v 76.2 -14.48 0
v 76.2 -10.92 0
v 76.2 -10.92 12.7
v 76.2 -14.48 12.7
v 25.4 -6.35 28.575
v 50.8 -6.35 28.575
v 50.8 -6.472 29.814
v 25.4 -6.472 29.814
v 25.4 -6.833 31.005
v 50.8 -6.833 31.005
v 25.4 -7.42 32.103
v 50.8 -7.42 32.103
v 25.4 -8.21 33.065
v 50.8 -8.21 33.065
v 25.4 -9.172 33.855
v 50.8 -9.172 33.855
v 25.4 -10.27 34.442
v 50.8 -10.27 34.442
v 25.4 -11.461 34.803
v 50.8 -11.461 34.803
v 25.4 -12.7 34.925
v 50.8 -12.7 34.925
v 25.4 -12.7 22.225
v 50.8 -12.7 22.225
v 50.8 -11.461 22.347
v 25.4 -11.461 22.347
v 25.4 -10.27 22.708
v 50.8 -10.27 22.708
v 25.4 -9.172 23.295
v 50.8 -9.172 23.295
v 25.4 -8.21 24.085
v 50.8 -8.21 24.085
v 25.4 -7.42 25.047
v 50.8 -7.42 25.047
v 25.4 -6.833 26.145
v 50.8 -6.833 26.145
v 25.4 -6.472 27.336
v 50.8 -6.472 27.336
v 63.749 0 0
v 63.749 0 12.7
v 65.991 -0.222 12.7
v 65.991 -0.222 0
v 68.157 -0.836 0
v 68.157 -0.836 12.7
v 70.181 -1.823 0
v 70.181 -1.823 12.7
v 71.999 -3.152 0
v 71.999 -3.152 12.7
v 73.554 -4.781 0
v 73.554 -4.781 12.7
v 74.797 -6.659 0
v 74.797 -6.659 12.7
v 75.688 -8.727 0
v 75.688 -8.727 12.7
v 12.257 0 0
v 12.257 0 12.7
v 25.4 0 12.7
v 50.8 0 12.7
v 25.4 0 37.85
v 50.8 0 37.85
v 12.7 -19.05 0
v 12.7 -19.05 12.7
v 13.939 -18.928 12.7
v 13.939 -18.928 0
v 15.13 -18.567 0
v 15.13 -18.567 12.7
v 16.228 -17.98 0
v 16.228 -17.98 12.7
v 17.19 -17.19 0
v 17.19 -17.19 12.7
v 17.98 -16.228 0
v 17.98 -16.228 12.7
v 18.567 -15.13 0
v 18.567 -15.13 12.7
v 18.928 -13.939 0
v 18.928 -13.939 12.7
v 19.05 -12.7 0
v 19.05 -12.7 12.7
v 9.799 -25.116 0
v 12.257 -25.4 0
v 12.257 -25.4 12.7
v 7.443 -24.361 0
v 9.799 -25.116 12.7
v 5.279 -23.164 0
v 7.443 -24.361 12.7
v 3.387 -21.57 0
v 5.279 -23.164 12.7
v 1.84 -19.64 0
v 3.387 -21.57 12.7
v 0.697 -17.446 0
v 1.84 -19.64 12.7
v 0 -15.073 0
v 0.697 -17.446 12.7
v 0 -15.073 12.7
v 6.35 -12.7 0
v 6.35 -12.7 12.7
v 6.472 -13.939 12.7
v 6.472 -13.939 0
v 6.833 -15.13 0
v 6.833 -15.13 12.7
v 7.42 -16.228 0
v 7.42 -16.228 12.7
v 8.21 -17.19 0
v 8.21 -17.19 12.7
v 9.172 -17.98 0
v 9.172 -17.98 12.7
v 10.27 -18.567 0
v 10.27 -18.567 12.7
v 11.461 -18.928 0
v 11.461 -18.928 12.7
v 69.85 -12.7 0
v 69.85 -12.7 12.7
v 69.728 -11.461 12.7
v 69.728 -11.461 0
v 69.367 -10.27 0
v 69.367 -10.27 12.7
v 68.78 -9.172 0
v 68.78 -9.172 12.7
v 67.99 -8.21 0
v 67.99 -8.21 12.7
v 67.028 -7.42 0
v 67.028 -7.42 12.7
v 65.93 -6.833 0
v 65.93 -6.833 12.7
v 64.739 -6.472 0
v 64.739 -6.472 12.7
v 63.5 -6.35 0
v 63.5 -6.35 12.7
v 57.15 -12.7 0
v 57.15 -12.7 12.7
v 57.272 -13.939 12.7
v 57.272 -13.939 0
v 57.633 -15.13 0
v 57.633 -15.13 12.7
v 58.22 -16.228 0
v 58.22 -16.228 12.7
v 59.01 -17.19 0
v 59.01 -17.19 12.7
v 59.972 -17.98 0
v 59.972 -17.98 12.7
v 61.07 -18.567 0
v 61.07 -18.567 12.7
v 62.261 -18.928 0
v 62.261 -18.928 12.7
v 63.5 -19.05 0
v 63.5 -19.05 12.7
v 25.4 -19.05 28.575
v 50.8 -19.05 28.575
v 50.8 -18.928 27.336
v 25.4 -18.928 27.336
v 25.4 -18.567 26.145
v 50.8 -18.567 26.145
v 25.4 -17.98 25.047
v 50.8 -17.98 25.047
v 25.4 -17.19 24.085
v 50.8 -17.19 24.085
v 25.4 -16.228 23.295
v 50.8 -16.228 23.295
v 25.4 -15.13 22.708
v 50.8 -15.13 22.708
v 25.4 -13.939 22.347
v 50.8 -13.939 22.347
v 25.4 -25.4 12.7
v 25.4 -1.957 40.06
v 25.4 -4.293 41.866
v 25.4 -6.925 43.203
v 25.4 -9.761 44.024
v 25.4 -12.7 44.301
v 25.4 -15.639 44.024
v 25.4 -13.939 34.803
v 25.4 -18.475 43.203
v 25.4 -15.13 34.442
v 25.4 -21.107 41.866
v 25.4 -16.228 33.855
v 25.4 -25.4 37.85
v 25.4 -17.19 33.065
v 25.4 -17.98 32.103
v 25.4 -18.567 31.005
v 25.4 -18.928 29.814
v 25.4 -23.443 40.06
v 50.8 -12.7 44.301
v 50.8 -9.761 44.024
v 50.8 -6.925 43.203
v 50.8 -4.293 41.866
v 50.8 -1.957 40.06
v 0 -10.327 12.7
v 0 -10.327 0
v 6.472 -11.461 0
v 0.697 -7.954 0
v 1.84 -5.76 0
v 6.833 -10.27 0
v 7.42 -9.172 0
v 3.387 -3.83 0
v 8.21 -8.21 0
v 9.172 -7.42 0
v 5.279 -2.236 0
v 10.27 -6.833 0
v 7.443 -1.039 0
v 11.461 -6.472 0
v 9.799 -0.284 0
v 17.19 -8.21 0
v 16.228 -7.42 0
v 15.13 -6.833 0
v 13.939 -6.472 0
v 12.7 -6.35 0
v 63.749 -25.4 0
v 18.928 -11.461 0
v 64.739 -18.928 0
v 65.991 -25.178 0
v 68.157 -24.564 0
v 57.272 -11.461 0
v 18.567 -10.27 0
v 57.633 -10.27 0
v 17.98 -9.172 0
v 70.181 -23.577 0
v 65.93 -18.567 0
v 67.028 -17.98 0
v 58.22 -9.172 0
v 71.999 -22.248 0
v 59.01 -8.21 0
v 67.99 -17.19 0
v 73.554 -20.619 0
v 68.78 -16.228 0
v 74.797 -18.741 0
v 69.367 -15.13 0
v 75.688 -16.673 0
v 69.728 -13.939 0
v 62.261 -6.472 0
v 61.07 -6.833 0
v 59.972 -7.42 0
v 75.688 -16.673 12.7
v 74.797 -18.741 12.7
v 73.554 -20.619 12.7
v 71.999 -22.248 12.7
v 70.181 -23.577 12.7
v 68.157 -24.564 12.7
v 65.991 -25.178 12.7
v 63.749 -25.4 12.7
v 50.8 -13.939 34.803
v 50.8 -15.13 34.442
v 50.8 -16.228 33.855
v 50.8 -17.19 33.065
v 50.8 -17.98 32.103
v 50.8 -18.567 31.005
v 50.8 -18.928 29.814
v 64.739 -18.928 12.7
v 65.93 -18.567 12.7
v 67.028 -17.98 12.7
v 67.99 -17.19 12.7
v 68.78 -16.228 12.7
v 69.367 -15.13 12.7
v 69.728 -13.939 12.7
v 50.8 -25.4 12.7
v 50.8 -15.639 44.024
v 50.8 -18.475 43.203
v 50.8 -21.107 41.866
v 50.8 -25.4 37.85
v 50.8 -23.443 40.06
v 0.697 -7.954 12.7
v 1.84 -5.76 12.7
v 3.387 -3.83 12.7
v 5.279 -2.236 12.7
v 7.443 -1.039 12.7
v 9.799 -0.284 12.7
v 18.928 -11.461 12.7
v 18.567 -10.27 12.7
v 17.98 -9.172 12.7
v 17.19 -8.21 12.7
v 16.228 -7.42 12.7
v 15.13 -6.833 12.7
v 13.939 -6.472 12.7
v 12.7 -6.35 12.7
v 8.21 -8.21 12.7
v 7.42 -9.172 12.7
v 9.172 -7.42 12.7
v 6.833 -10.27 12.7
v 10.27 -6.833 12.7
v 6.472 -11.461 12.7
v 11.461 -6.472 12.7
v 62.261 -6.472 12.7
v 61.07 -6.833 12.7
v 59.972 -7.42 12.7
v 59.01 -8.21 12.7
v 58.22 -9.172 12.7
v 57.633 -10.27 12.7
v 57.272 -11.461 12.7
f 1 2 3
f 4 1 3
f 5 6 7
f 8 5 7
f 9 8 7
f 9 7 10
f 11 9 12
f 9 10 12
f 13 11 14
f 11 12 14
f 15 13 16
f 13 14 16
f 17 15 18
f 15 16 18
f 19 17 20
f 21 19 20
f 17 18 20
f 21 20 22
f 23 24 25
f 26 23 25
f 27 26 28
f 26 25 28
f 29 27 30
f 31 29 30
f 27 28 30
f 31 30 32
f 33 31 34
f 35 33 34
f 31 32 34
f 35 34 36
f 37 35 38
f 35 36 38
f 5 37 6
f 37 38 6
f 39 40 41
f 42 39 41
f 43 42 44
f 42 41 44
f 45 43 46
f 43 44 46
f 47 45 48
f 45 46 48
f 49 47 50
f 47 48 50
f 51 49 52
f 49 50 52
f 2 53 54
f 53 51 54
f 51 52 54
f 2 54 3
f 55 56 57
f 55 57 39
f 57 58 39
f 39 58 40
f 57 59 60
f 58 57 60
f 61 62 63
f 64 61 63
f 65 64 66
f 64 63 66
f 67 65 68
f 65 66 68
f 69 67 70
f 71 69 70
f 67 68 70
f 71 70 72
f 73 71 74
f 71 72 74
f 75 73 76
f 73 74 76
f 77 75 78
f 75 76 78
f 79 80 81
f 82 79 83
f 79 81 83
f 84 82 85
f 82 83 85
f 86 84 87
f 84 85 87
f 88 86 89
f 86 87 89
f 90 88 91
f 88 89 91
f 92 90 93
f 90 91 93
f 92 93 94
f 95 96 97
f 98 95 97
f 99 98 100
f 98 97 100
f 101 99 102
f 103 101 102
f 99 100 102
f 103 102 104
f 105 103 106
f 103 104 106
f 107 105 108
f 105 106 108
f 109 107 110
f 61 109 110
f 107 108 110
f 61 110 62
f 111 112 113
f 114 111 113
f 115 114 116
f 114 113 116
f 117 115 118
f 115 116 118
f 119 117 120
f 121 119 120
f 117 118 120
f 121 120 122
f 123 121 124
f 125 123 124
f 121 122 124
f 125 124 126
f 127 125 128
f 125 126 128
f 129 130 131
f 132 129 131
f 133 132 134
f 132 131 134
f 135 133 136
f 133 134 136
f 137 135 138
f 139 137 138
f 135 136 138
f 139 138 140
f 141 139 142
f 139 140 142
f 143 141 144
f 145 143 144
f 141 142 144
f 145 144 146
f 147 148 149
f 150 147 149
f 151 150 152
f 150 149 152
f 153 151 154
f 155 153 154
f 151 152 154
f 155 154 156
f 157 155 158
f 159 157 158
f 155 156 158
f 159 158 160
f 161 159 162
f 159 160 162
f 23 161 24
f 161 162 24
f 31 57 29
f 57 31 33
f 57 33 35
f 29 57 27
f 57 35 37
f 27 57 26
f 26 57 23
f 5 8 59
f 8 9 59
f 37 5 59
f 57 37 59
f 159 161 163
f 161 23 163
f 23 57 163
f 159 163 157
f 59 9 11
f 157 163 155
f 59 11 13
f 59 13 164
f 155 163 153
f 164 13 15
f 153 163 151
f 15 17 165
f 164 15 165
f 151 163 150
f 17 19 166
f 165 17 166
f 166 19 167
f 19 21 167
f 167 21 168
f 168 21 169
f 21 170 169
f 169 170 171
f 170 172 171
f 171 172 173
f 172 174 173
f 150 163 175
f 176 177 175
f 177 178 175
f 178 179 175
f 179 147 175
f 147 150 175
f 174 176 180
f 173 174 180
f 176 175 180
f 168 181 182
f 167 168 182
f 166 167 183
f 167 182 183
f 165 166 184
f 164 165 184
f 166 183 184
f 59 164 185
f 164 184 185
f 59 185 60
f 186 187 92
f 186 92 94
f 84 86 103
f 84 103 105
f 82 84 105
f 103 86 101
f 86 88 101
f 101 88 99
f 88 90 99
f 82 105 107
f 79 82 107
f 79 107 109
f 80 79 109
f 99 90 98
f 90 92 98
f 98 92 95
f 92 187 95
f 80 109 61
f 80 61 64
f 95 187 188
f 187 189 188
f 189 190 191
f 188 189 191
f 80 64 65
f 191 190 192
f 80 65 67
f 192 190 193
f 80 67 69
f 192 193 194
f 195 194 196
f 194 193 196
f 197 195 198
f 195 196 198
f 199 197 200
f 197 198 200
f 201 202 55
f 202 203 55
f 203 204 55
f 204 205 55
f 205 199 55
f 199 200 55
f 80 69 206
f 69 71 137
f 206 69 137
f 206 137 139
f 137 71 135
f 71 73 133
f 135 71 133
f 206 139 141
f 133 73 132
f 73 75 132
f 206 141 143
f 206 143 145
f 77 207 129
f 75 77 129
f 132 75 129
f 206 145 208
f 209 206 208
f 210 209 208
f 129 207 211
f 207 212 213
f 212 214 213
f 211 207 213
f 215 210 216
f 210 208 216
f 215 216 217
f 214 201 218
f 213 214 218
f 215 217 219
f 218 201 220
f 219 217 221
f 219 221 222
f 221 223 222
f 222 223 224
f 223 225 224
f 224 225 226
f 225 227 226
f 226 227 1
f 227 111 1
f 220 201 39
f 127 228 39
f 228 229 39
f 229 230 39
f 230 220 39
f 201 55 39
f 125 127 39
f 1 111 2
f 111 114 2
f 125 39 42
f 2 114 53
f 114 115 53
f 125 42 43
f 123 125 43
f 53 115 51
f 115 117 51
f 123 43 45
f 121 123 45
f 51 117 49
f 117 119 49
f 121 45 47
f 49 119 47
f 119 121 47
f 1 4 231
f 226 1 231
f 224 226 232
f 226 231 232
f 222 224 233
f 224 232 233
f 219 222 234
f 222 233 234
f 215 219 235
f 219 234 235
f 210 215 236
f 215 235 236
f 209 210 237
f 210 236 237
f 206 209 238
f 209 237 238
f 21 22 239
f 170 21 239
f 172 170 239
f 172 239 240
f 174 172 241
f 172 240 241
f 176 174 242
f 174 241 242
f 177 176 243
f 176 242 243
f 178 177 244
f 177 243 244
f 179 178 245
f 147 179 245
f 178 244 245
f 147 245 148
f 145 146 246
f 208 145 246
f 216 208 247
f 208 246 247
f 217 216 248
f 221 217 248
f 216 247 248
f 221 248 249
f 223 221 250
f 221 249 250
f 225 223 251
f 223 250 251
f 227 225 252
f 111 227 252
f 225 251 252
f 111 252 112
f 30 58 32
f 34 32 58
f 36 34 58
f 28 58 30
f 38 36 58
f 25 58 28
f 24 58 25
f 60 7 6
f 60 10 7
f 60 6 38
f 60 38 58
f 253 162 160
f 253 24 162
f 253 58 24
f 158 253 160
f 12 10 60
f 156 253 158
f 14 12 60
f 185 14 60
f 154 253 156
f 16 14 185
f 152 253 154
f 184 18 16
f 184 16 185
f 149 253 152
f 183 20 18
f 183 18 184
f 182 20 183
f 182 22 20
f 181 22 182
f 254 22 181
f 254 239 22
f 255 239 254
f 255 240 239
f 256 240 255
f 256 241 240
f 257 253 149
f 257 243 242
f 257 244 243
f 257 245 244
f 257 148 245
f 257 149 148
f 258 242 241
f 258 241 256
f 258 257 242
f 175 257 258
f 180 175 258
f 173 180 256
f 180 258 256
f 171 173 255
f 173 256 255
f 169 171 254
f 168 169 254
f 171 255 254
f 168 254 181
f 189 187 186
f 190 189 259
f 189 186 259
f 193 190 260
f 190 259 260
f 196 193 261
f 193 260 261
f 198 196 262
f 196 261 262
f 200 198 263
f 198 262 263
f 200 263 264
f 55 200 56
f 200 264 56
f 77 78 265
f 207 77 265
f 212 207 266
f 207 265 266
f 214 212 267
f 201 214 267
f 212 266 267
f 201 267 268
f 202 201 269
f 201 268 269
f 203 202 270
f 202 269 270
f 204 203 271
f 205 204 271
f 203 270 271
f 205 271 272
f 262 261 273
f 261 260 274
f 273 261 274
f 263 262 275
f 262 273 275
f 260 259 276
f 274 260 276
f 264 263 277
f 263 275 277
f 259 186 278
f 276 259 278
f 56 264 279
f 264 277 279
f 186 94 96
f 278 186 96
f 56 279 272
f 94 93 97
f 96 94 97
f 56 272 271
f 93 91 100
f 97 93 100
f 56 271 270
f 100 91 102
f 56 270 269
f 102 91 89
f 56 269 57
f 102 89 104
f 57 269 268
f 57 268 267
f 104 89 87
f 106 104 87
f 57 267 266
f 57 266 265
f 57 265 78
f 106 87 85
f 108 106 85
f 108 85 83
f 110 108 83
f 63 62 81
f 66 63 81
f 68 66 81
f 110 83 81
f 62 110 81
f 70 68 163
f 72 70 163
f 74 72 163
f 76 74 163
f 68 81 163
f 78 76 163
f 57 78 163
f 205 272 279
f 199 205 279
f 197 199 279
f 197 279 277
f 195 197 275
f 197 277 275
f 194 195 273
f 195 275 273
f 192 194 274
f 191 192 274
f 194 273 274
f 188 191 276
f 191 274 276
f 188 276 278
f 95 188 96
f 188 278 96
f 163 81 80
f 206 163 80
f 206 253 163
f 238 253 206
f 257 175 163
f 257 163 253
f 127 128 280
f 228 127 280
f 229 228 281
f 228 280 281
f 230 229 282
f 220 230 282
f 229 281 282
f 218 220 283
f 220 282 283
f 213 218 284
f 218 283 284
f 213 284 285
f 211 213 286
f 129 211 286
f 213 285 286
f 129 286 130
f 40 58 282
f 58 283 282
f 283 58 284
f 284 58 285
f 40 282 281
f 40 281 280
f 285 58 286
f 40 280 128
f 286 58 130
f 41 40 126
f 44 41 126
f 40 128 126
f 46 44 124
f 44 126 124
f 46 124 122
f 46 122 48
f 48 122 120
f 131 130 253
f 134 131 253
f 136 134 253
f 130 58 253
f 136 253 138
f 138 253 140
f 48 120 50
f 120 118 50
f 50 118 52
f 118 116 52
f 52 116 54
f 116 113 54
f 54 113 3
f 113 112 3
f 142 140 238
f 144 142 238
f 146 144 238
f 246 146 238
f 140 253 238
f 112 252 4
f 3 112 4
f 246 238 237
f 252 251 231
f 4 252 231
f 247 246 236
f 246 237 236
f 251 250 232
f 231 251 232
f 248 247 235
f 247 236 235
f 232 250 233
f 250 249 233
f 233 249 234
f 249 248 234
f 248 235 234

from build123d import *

# Parameters (mm, degrees)
F0_W     = 76.2
F0_H     = 44.45
F1_DEPTH = 25.4
F2_W     = 25.4
F2_H     = 31.75
F3_DEPTH = 25.4
F5_DEPTH = 25.4
F7_DEPTH = 25.4
F9_DEPTH = 25.4


with BuildPart() as f1:
    # F0 (on Front) → F1 (new body)
    with BuildSketch(Plane.XZ):
        with Locations((38.1, 22.225)):
            Rectangle(F0_W, F0_H)
    extrude(amount=F1_DEPTH)

    # F2 (on face) → F3 (cut)
    with BuildSketch(Plane.XZ.offset(25.4)):
        with Locations((12.7, 28.575)):
            Rectangle(F2_W, F2_H)
        with Locations((63.5, 28.575)):
            Rectangle(F2_W, F2_H)
    extrude(amount=-F3_DEPTH, mode=Mode.SUBTRACT)

    # F4 (on face) → F5 (cut)
    with BuildSketch(Plane.YZ.offset(50.8)):
        with BuildLine():
            Line((-12.7, 28.575), (-12.7, 34.925))
            ThreePointArc((-12.7, 34.925), (-17.1901280605, 33.0651280605), (-19.05, 28.575))
            Line((-19.05, 28.575), (-12.7, 28.575))
        make_face()
        with BuildLine():
            ThreePointArc((-6.35, 28.575), (-8.2098719395, 33.0651280605), (-12.7, 34.925))
            Line((-12.7, 34.925), (-12.7, 28.575))
            Line((-12.7, 28.575), (-6.35, 28.575))
        make_face()
        with BuildLine():
            Line((-6.35, 28.575), (-12.7, 28.575))
            Line((-12.7, 28.575), (-12.7, 22.225))
            ThreePointArc((-12.7, 22.225), (-8.2098719395, 24.0848719395), (-6.35, 28.575))
        make_face()
        with BuildLine():
            Line((-12.7, 22.225), (-12.7, 28.575))
            Line((-12.7, 28.575), (-19.05, 28.575))
            ThreePointArc((-19.05, 28.575), (-17.1901280605, 24.0848719395), (-12.7, 22.225))
        make_face()
        with BuildLine():
            Line((-12.7, 44.3012688375), (-12.7, 44.45))
            Line((-12.7, 44.45), (-25.4, 44.45))
            Line((-25.4, 44.45), (-25.4, 37.8499949622))
            ThreePointArc((-25.4, 37.8499949622), (-19.8223053609, 42.5959948968), (-12.7, 44.3012688375))
        make_face()
        with BuildLine():
            Line((0, 44.45), (-12.7, 44.45))
            Line((-12.7, 44.45), (-12.7, 44.3012688375))
            ThreePointArc((-12.7, 44.3012688375), (-5.5776946391, 42.5959948968), (0, 37.8499949622))
            Line((0, 37.8499949622), (0, 44.45))
        make_face()
    extrude(amount=-F5_DEPTH, mode=Mode.SUBTRACT)

    # F6 (on face) → F7 (cut)
    with BuildSketch(Plane.XY.offset(12.7)):
        with BuildLine():
            Line((6.35, -12.7), (12.7, -12.7))
            Line((12.7, -12.7), (12.7, -6.35))
            ThreePointArc((12.7, -6.35), (8.2098719395, -8.2098719395), (6.35, -12.7))
        make_face()
        with BuildLine():
            Line((12.7, -12.7), (19.05, -12.7))
            ThreePointArc((19.05, -12.7), (17.1901280605, -8.2098719395), (12.7, -6.35))
            Line((12.7, -6.35), (12.7, -12.7))
        make_face()
        with BuildLine():
            Line((12.7, -19.05), (12.7, -12.7))
            Line((12.7, -12.7), (6.35, -12.7))
            ThreePointArc((6.35, -12.7), (8.2098719395, -17.1901280605), (12.7, -19.05))
        make_face()
        with BuildLine():
            ThreePointArc((12.7, -19.05), (17.1901280605, -17.1901280605), (19.05, -12.7))
            Line((19.05, -12.7), (12.7, -12.7))
            Line((12.7, -12.7), (12.7, -19.05))
        make_face()
        with BuildLine():
            ThreePointArc((0, -10.327417444), (4.2938587705, -2.9864667778), (12.2567600012, 0))
            Line((12.2567600012, 0), (0, 0))
            Line((0, 0), (0, -10.327417444))
        make_face()
        with BuildLine():
            Line((0, -25.4), (12.2567600012, -25.4))
            ThreePointArc((12.2567600012, -25.4), (4.2938587705, -22.4135332222), (0, -15.072582556))
            Line((0, -15.072582556), (0, -25.4))
        make_face()
    extrude(amount=-F7_DEPTH, mode=Mode.SUBTRACT)

    # F8 (on face) → F9 (cut)
    with BuildSketch(Plane.XY.offset(12.7)):
        with BuildLine():
            ThreePointArc((63.5, -19.05), (67.9901280605, -17.1901280605), (69.85, -12.7))
            Line((69.85, -12.7), (63.5, -12.7))
            Line((63.5, -12.7), (63.5, -19.05))
        make_face()
        with BuildLine():
            Line((63.5, -12.7), (69.85, -12.7))
            ThreePointArc((69.85, -12.7), (67.9901280605, -8.2098719395), (63.5, -6.35))
            Line((63.5, -6.35), (63.5, -12.7))
        make_face()
        with BuildLine():
            Line((63.5, -19.05), (63.5, -12.7))
            Line((63.5, -12.7), (57.15, -12.7))
            ThreePointArc((57.15, -12.7), (59.0098719395, -17.1901280605), (63.5, -19.05))
        make_face()
        with BuildLine():
            Line((57.15, -12.7), (63.5, -12.7))
            Line((63.5, -12.7), (63.5, -6.35))
            ThreePointArc((63.5, -6.35), (59.0098719395, -8.2098719395), (57.15, -12.7))
        make_face()
        with BuildLine():
            Line((76.2, -25.4), (76.2, -14.4800225697))
            ThreePointArc((76.2, -14.4800225697), (71.9993464021, -22.2483812307), (63.7494866416, -25.4))
            Line((63.7494866416, -25.4), (76.2, -25.4))
        make_face()
        with BuildLine():
            ThreePointArc((63.7494866416, 0), (71.9993464021, -3.1516187693), (76.2, -10.9199774303))
            Line((76.2, -10.9199774303), (76.2, 0))
            Line((76.2, 0), (63.7494866416, 0))
        make_face()
    extrude(amount=-F9_DEPTH, mode=Mode.SUBTRACT)


solid = f1.part
